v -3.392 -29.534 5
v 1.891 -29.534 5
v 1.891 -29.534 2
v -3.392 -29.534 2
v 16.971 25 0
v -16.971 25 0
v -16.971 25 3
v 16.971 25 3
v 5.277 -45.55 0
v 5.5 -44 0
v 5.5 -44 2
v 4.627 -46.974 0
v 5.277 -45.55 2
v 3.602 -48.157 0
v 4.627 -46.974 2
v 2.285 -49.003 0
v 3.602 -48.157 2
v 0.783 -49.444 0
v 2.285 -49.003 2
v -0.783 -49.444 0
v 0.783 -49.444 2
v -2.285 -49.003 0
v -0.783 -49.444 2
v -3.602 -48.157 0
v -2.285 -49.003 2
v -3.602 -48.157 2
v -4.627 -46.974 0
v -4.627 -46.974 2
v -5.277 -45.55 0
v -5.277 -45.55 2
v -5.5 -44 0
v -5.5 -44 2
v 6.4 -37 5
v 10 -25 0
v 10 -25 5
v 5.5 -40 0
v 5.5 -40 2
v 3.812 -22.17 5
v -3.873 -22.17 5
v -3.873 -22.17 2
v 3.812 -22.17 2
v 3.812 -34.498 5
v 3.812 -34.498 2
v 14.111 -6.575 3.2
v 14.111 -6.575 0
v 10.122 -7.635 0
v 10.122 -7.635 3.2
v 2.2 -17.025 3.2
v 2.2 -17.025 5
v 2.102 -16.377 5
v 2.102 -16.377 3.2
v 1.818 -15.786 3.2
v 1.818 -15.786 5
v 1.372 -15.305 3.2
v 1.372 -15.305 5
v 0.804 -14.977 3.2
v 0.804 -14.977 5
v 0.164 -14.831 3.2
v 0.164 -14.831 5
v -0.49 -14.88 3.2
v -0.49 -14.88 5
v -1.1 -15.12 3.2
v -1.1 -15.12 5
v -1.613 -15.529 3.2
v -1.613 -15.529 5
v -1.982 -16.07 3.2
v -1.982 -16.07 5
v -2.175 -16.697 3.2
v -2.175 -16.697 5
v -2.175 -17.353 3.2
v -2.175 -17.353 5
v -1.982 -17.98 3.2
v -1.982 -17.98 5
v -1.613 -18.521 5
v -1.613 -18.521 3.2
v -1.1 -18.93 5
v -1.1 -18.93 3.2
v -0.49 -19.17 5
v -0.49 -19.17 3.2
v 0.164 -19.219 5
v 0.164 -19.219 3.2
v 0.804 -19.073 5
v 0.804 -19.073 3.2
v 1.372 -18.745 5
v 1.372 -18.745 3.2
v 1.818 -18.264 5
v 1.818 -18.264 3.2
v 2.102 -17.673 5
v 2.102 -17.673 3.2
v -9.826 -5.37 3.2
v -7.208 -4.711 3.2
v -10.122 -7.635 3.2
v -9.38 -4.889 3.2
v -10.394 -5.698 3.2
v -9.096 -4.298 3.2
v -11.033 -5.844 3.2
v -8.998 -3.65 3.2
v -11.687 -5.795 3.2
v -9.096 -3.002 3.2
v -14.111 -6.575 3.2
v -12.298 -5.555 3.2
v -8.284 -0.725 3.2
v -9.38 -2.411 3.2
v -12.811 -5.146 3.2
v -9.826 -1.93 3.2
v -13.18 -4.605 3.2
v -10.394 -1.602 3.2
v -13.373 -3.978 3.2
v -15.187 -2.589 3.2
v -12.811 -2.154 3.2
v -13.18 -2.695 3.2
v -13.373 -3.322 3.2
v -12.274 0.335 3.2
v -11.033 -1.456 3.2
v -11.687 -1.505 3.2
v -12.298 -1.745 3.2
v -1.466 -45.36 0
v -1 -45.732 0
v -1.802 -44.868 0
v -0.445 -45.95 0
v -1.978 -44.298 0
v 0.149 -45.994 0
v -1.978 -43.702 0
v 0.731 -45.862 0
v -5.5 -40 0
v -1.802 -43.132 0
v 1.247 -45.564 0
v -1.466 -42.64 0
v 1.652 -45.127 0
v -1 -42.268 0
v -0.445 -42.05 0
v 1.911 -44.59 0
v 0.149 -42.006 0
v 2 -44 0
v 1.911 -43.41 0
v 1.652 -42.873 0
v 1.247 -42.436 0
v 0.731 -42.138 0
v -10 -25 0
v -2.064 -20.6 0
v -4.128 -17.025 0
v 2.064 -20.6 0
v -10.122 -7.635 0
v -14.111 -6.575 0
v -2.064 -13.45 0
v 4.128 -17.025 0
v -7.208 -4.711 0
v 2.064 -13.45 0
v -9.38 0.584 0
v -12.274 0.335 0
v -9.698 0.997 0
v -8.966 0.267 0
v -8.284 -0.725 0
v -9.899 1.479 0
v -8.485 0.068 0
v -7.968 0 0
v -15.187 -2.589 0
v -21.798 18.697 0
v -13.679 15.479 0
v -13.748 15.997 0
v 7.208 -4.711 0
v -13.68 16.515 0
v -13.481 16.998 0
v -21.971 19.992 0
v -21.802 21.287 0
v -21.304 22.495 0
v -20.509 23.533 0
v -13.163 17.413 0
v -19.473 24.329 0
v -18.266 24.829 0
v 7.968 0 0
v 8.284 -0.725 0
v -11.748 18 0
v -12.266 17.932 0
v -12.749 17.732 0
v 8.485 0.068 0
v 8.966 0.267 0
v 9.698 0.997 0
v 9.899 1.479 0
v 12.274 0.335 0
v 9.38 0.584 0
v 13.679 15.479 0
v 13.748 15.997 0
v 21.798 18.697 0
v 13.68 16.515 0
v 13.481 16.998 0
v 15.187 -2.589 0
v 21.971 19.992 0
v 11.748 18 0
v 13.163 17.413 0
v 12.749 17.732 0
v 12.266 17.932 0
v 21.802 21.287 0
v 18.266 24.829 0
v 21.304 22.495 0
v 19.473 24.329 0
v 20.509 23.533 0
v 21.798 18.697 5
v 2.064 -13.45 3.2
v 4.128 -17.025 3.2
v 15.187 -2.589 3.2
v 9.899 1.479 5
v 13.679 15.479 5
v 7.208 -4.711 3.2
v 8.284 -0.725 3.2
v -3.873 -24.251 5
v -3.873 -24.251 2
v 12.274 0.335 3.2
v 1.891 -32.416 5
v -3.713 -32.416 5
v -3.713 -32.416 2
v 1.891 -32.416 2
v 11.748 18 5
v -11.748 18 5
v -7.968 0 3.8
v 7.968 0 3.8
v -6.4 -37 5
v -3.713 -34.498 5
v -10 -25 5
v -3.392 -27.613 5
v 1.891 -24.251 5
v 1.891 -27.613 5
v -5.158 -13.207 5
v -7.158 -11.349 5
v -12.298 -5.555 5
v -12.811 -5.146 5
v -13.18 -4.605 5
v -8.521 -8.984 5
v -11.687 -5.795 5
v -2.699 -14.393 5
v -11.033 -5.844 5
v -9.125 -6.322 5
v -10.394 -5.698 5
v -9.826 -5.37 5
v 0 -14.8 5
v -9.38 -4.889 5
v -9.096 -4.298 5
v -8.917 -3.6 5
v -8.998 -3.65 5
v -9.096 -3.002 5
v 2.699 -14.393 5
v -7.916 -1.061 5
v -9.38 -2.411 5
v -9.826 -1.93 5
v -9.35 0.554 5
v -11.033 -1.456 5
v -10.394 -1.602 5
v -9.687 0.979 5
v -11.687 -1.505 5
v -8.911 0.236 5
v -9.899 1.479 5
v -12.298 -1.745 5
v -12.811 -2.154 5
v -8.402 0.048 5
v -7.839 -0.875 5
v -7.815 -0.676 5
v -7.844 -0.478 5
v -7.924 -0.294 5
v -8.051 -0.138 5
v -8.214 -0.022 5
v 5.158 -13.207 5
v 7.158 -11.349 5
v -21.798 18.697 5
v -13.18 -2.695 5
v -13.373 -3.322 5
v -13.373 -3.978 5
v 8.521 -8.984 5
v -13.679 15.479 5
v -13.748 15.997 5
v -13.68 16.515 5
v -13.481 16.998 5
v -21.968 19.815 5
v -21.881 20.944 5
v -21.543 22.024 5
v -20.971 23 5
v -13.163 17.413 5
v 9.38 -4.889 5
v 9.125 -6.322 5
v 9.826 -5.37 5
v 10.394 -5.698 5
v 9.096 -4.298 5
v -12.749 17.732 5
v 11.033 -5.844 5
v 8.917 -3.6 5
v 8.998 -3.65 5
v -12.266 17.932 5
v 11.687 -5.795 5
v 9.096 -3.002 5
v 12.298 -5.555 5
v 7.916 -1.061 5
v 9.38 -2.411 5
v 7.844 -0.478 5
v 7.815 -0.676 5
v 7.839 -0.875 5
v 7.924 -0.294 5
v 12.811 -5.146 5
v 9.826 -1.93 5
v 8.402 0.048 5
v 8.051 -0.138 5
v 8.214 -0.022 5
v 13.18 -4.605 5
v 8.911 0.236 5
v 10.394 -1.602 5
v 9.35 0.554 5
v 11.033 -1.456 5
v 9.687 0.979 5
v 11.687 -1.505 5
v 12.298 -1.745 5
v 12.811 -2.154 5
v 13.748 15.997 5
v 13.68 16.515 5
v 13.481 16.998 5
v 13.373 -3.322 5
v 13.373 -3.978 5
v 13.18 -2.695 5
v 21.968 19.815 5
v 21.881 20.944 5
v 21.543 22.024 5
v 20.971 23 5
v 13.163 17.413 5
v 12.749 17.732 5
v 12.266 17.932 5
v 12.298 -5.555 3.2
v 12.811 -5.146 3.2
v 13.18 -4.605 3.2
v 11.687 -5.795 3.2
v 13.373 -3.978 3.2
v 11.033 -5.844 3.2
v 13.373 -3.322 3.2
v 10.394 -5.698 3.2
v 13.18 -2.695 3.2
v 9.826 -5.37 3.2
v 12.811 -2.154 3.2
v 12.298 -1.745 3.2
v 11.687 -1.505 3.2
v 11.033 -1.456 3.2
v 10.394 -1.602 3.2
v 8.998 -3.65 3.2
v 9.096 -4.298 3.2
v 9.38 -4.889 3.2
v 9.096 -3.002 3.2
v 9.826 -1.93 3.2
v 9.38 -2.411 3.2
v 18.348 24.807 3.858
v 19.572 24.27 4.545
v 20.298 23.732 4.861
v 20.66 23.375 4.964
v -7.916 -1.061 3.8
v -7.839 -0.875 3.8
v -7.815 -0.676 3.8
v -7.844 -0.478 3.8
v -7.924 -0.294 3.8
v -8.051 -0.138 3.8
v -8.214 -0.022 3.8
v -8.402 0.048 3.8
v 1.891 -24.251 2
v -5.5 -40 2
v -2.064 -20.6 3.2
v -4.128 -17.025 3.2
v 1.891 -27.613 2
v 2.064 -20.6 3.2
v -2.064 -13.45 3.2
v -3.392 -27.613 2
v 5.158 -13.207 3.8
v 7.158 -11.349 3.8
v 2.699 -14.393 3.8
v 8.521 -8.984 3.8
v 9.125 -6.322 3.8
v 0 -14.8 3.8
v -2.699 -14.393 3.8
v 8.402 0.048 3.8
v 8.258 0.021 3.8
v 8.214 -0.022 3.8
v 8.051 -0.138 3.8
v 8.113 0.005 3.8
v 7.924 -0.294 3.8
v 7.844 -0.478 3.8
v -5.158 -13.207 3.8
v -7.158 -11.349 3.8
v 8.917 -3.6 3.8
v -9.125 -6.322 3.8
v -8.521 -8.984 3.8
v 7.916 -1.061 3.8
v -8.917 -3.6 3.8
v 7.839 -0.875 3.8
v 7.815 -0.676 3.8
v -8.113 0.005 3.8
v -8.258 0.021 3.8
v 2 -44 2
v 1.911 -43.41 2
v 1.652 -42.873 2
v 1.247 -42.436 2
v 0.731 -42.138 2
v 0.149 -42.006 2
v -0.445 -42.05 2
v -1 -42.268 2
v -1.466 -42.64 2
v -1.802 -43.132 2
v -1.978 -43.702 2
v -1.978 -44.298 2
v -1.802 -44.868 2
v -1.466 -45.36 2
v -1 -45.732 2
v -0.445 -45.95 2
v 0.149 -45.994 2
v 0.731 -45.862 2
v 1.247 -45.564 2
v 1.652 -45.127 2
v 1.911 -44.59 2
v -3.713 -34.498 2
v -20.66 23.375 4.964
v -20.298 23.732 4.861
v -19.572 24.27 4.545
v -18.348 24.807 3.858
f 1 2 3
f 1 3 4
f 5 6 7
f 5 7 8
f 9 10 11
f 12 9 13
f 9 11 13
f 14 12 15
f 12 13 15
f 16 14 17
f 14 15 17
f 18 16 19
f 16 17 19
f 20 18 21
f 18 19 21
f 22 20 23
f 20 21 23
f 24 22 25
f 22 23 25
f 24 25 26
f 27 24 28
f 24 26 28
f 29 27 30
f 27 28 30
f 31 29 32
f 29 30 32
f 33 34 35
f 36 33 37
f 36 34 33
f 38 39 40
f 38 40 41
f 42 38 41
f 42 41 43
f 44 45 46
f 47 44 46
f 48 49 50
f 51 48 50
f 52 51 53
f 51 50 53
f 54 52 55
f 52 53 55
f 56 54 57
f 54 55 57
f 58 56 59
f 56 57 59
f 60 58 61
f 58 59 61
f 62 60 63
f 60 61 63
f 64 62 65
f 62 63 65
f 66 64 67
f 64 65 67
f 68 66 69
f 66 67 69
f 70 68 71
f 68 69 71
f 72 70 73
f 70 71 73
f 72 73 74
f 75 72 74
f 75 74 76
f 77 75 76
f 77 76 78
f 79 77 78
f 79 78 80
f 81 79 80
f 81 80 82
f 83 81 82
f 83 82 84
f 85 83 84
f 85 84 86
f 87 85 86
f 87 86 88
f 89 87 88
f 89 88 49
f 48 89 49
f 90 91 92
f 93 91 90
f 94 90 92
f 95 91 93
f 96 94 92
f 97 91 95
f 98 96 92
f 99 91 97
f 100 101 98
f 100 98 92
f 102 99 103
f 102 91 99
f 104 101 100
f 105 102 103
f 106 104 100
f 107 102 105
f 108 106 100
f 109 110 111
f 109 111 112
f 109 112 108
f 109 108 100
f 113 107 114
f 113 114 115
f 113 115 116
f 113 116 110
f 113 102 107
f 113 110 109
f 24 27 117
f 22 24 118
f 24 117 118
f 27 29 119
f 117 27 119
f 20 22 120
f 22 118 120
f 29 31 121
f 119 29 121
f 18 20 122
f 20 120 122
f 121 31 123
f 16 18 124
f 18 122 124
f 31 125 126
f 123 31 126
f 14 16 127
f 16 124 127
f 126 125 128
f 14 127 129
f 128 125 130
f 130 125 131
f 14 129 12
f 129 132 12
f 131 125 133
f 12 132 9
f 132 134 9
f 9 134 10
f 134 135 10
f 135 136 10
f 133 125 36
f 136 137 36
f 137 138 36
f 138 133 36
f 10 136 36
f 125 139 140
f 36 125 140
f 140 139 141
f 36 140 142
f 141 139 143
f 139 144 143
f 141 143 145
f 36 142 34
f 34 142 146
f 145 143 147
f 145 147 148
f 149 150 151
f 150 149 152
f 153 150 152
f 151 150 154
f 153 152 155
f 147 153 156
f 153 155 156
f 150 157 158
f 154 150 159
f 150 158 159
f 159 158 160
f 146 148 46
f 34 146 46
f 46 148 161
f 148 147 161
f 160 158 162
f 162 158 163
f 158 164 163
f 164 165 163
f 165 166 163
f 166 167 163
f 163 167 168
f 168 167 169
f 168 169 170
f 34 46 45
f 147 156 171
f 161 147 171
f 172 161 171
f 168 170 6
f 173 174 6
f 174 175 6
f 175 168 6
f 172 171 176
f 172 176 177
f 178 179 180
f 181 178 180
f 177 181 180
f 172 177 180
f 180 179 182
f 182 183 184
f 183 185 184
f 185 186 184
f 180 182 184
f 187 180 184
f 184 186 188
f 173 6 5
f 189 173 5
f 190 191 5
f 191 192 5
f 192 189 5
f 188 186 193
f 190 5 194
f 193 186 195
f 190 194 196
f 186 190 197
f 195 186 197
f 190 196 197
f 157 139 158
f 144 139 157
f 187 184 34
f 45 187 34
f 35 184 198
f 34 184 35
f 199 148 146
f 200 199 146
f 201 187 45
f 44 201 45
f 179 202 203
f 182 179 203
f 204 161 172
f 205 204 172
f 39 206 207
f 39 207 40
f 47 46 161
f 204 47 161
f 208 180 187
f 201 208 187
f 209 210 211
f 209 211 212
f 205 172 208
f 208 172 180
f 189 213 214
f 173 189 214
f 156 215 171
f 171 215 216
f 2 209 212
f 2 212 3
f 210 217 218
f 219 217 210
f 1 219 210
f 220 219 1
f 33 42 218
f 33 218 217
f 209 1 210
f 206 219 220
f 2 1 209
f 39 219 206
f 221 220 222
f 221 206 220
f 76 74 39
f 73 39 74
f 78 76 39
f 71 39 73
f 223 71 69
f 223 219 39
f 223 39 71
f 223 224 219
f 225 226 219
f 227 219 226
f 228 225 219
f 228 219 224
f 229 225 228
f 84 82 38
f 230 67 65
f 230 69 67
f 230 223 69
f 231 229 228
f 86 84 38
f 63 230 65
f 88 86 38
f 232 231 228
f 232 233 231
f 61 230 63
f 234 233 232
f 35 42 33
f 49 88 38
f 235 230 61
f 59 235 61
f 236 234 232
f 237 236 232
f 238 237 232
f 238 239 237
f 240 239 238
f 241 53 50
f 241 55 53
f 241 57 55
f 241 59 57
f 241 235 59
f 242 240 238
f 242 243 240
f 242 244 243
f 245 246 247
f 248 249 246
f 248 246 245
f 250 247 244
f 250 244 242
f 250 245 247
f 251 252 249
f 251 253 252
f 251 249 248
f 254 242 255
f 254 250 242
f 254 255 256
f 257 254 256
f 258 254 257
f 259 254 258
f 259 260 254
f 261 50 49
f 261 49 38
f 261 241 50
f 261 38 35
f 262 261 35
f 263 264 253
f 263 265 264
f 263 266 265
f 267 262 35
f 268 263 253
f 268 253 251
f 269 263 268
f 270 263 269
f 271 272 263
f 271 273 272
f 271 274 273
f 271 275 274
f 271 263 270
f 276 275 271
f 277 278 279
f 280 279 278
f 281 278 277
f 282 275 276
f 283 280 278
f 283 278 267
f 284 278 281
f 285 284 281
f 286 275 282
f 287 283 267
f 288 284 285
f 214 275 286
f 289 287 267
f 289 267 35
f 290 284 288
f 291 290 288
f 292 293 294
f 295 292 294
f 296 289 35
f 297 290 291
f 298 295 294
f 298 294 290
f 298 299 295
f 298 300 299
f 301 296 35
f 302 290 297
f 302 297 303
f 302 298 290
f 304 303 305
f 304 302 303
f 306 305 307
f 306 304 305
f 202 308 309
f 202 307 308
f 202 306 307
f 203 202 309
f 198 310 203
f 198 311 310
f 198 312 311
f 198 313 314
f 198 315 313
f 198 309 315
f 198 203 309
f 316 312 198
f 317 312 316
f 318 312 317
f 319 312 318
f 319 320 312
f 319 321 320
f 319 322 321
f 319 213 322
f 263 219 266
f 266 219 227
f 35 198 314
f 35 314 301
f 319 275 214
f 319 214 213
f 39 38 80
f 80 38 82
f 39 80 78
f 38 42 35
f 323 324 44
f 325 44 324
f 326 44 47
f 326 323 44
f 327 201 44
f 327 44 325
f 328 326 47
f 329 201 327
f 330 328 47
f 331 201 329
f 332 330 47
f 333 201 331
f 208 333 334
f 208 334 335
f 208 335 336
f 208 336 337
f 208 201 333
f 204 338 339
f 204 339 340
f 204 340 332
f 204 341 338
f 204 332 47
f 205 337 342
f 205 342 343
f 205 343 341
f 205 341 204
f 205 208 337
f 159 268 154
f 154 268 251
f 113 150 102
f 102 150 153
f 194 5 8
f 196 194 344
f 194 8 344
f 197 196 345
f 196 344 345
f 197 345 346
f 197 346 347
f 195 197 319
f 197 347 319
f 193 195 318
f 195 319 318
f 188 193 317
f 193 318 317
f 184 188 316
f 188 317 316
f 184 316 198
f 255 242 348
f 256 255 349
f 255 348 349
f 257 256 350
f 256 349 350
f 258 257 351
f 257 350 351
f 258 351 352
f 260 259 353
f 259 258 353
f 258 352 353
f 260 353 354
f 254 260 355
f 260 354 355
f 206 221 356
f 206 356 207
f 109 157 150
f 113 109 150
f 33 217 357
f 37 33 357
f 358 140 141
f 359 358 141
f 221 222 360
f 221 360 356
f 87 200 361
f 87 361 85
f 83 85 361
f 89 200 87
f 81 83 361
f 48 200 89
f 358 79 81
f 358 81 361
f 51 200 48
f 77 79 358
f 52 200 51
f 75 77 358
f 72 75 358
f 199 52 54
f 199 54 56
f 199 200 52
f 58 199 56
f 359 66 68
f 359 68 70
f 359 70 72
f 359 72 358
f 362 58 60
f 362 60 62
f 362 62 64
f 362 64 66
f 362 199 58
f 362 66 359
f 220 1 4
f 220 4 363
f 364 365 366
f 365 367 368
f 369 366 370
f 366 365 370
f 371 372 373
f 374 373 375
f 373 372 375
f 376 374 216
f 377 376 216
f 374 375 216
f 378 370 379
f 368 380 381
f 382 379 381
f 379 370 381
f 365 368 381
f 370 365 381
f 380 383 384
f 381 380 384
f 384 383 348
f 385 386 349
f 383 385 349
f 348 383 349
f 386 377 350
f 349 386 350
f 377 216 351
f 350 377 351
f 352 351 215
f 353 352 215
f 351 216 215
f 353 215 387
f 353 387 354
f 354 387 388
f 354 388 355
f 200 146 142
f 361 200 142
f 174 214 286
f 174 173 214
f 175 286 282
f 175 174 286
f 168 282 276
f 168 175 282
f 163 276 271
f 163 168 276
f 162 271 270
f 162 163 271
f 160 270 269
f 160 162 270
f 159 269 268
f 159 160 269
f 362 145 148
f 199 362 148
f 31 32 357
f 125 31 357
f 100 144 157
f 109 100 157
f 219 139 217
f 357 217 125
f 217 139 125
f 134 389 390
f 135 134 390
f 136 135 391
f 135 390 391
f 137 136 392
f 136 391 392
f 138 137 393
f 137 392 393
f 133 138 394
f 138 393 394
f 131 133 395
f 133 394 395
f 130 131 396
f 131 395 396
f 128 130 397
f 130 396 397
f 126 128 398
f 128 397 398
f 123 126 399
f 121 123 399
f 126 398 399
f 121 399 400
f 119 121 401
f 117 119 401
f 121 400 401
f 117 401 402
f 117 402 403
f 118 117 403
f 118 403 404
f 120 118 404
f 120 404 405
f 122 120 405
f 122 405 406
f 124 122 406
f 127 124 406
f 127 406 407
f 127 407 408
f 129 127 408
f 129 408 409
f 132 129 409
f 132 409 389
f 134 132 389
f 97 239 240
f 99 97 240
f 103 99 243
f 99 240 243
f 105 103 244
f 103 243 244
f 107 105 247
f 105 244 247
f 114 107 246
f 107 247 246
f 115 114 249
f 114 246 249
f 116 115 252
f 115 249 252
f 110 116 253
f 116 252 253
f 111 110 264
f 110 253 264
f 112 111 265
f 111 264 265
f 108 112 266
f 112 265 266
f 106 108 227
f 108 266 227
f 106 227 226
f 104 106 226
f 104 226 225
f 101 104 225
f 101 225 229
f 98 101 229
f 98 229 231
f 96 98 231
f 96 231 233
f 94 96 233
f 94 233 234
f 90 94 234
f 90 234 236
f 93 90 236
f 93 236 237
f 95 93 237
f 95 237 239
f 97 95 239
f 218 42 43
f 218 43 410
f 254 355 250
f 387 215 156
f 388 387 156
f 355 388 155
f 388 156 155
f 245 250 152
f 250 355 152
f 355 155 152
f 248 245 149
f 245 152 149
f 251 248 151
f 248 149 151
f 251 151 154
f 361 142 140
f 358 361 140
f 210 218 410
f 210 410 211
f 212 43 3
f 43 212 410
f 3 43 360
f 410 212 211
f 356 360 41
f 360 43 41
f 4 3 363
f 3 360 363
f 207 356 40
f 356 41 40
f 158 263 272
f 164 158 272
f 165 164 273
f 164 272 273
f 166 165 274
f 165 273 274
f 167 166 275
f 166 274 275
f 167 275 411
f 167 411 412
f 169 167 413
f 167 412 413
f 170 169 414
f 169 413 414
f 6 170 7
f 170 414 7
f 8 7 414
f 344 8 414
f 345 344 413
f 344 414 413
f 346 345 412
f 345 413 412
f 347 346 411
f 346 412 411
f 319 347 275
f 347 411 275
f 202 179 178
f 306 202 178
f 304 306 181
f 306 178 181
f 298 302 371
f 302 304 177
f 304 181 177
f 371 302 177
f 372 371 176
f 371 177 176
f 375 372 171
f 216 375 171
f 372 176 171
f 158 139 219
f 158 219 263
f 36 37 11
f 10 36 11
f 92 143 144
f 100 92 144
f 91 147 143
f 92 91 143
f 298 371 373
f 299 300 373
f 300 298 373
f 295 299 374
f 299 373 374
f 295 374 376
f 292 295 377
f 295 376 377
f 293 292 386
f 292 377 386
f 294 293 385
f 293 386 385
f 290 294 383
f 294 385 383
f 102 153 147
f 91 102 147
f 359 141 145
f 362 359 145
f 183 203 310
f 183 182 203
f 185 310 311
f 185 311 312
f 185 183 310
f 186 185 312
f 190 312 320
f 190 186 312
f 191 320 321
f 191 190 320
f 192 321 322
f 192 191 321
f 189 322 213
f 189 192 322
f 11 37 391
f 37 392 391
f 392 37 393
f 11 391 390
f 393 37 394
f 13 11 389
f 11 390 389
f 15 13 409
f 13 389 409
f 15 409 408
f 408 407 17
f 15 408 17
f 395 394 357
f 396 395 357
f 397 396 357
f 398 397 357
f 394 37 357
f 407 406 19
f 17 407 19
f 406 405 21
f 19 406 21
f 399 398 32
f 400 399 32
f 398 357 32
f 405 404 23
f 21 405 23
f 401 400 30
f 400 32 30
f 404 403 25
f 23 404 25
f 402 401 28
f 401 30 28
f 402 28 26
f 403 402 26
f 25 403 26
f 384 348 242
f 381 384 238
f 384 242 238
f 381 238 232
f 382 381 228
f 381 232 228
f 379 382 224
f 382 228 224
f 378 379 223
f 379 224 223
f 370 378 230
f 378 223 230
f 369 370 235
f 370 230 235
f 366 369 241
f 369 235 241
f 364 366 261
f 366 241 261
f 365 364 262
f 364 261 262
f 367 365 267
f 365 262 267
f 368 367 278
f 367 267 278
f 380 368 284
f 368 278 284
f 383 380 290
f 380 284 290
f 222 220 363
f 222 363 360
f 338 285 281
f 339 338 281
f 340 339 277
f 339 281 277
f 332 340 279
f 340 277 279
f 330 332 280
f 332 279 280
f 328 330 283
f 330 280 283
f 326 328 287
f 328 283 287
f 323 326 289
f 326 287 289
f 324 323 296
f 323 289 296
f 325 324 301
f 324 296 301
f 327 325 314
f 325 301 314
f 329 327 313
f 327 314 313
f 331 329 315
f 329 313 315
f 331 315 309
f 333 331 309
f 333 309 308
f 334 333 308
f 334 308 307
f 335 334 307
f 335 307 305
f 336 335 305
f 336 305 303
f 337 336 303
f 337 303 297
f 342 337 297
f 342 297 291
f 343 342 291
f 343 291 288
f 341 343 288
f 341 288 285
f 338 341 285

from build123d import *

# Parameters (mm, degrees)
BOSS_EXTRUDE1_DEPTH = 5
CUT_EXTRUDE1_REACH  = 36.673
SKETCH5_R           = 9.15
CUT_EXTRUDE3_DEPTH  = 1.2
CUT_EXTRUDE4_REACH  = 36.673
SKETCH6_R           = 2.2
CUT_EXTRUDE5_DEPTH  = 3.2
SKETCH8_W           = 20
SKETCH8_H           = 5
BOSS_EXTRUDE2_DEPTH = 15
SKETCH3_R           = 2
BOSS_EXTRUDE3_DEPTH = 5
CUT_EXTRUDE6_REACH  = 57.023
FILLET2_R           = 2
CUT_EXTRUDE7_DEPTH  = 3
CUT_EXTRUDE8_DEPTH  = 12.5
FILLET3_R           = 5
FILLET4_R           = 2
FILLET5_R           = 0.75


with BuildPart() as part:
    # Sketch1 → Boss-Extrude1 (new body)
    with BuildSketch(Plane.XY):
        Polygon((-23.5, 25), (23.5, 25), (10, -25), (-10, -25), align=None)
    extrude(amount=BOSS_EXTRUDE1_DEPTH)

    # Sketch2 → Cut-Extrude1 (cut, up to next)
    with BuildSketch(Plane.XY.offset(5), mode=Mode.PRIVATE) as cut_extrude1_sk1:
        Polygon((-9.499337961, 0), (9.499337961, 0), (14.359337961, 18), (-14.359337961, 18), align=None)
    cut_extrude1_tool1 = extrude(cut_extrude1_sk1.sketch, amount=-CUT_EXTRUDE1_REACH, mode=Mode.PRIVATE) & part.part
    add(cut_extrude1_tool1.solids().sort_by_distance((0, 9.611098, 5))[0], mode=Mode.SUBTRACT)

    # Sketch5 → Cut-Extrude3 (cut)
    with BuildSketch(Plane.XY.offset(5)):
        with Locations((0, -5.65)):
            Circle(SKETCH5_R)
    extrude(amount=-CUT_EXTRUDE3_DEPTH, mode=Mode.SUBTRACT)

    # Sketch6 → Cut-Extrude4 (cut, up to next)
    with BuildSketch(Plane.XY.offset(5), mode=Mode.PRIVATE) as cut_extrude4_sk1:
        with Locations((-11.197795542, -3.65)):
            Circle(SKETCH6_R)
    cut_extrude4_tool1 = extrude(cut_extrude4_sk1.sketch, amount=-CUT_EXTRUDE4_REACH, mode=Mode.PRIVATE) & part.part
    # Sketch6 → Cut-Extrude4 (cut, up to next)
    with BuildSketch(Plane.XY.offset(5), mode=Mode.PRIVATE) as cut_extrude4_sk2:
        with Locations((0, -17.025)):
            Circle(SKETCH6_R)
    cut_extrude4_tool2 = extrude(cut_extrude4_sk2.sketch, amount=-CUT_EXTRUDE4_REACH, mode=Mode.PRIVATE) & part.part
    # Sketch6 → Cut-Extrude4 (cut, up to next)
    with BuildSketch(Plane.XY.offset(5), mode=Mode.PRIVATE) as cut_extrude4_sk3:
        with Locations(Location((11.197795542, -3.65, 0), (0, 0, 180))):
            Circle(SKETCH6_R)
    cut_extrude4_tool3 = extrude(cut_extrude4_sk3.sketch, amount=-CUT_EXTRUDE4_REACH, mode=Mode.PRIVATE) & part.part
    add(cut_extrude4_tool1.solids().sort_by_distance((-11.197796, -3.65, 5))[0], mode=Mode.SUBTRACT)
    add(cut_extrude4_tool2.solids().sort_by_distance((0, -17.025, 5))[0], mode=Mode.SUBTRACT)
    add(cut_extrude4_tool3.solids().sort_by_distance((11.197796, -3.65, 5))[0], mode=Mode.SUBTRACT)

    # Sketch7 → Cut-Extrude5 (cut)
    with BuildSketch(Plane(origin=(0, 0, 0), x_dir=(-1, 0, 0), z_dir=(0, 0, -1))):
        Polygon((-7.208365159, -4.710791476), (-8.284407984, -0.72544768), (-12.273838367, 0.335343796), (-15.187225925, -2.589208524), (-14.1111831, -6.57455232), (-10.121752717, -7.635343796), align=None)
        Polygon((-4.128054425, -17.025), (-2.064027212, -20.6), (2.064027212, -20.6), (4.128054425, -17.025), (2.064027212, -13.45), (-2.064027212, -13.45), align=None)
        Polygon((10.121752717, -7.635343796), (14.1111831, -6.57455232), (15.187225925, -2.589208524), (12.273838367, 0.335343796), (8.284407984, -0.72544768), (7.208365159, -4.710791476), align=None)
    extrude(amount=-CUT_EXTRUDE5_DEPTH, mode=Mode.SUBTRACT)

    # Sketch8 → Boss-Extrude2 (add)
    with BuildSketch(Plane.XZ.offset(25)):
        with Locations((0, 2.5)):
            Rectangle(SKETCH8_W, SKETCH8_H)
    extrude(amount=BOSS_EXTRUDE2_DEPTH)

    # Sketch3 → Boss-Extrude3 (add)
    with BuildSketch(Plane.XY.offset(5)):
        with BuildLine():
            Line((-5.5, -44), (-5.5, -40))
            Line((-5.5, -40), (5.5, -40))
            Line((5.5, -40), (5.5, -44))
            ThreePointArc((5.5, -44), (0, -49.5), (-5.5, -44))
        make_face()
        with Locations((0, -44)):
            Circle(SKETCH3_R, mode=Mode.SUBTRACT)
    extrude(amount=-BOSS_EXTRUDE3_DEPTH)

    # Sketch9 → Cut-Extrude6 (cut, up to next)
    with BuildSketch(Plane(origin=(0, 0, 0), x_dir=(-1, 0, 0), z_dir=(0, 0, -1)), mode=Mode.PRIVATE) as cut_extrude6_sk1:
        Polygon((-10, -25), (-5.5, -40), (-10, -40), align=None)
    cut_extrude6_tool1 = extrude(cut_extrude6_sk1.sketch, amount=-CUT_EXTRUDE6_REACH, mode=Mode.PRIVATE) & part.part
    # Sketch9 → Cut-Extrude6 (cut, up to next)
    with BuildSketch(Plane(origin=(0, 0, 0), x_dir=(-1, 0, 0), z_dir=(0, 0, -1)), mode=Mode.PRIVATE) as cut_extrude6_sk2:
        Polygon((10, -25), (5.5, -40), (10, -40), align=None)
    cut_extrude6_tool2 = extrude(cut_extrude6_sk2.sketch, amount=-CUT_EXTRUDE6_REACH, mode=Mode.PRIVATE) & part.part
    add(cut_extrude6_tool1.solids().sort_by_distance((8.5, -35, 0))[0], mode=Mode.SUBTRACT)
    add(cut_extrude6_tool2.solids().sort_by_distance((-8.5, -35, 0))[0], mode=Mode.SUBTRACT)

    # Fillet2
    fillet2_edges = [part.edges().sort_by_distance(p)[0] for p in [
        (-9.499337961, 0, 2.5),
        (-14.359337961, 18, 2.5),
        (14.359337961, 18, 2.5),
        (9.499337961, 0, 2.5),
    ]]
    fillet(fillet2_edges, radius=FILLET2_R)

    # Sketch12 → Cut-Extrude7 (cut)
    with BuildSketch(Plane.XY.offset(5)):
        Polygon((3.812269091, -22.169612745), (3.812269091, -34.497542433), (-3.712571108, -34.497542433), (-3.712571108, -32.416203654), (1.891033295, -32.416203654), (1.891033295, -29.534349961), (-3.392365142, -29.534349961), (-3.392365142, -27.613114166), (1.891033295, -27.613114166), (1.891033295, -24.250951523), (-3.872674091, -24.250951523), (-3.872674091, -22.169612745), align=None)
    extrude(amount=-CUT_EXTRUDE7_DEPTH, mode=Mode.SUBTRACT)

    # Sketch13 → Cut-Extrude8 (cut, symmetric)
    with BuildSketch(Plane.ZY.offset(5.5)):
        Polygon((5, -37), (2, -40), (2, -51.866140446), (5, -51.866140446), align=None)
    extrude(amount=CUT_EXTRUDE8_DEPTH, both=True, mode=Mode.SUBTRACT)

    # Fillet3
    fillet3_edges = [part.edges().sort_by_distance(p)[0] for p in [
        (-23.5, 25, 2.5),
        (23.5, 25, 2.5),
    ]]
    fillet(fillet3_edges, radius=FILLET3_R)

    # Fillet4
    # the kernel refuses this fillet: 2 mm, written as the material it takes off along each edge
    with BuildSketch(Plane(origin=(-21.970955687, 25, 5), x_dir=(0, 0, -1), z_dir=(1, 0, 0))) as fillet4_piece_1:
        with BuildLine():
            CenterArc((FILLET4_R, -FILLET4_R), FILLET4_R, 90, 90)
            Line((0, -FILLET4_R), (0, 0))
            Line((0, 0), (FILLET4_R, 0))
        make_face()
    extrude(amount=43.941911373, mode=Mode.SUBTRACT)

    # Fillet5
    # the kernel refuses this fillet: 0.75 mm, written as the material it takes off along each edge
    with BuildSketch(Plane(origin=(-7.197221686, 0, 3.8), x_dir=(-0.999217435066786, 0.03955398157649034, 0), z_dir=(0, 0, 1))) as fillet5_piece_1:
        with BuildLine():
            CenterArc((1.339281213, 0.737984469), FILLET5_R, 152.162782465, 107.567464563)
            Line((0.676072834, 1.088205323), (0.609751996, 1.123227408))
            ThreePointArc((0.609751996, 1.123227408), (0.293398819, 0.571834806), (-0.060779257, 0.043941801))
            Line((-0.060779257, 0.043941801), (0.002966549, -0.074941308))
            ThreePointArc((0.002966549, -0.074941308), (0.772862133, -0.044465022), (1.192197913, -0.073798447))
            Line((1.192197913, -0.073798447), (1.205569122, 0))
        make_face()
    extrude(amount=4.402796923, mode=Mode.SUBTRACT)
    with BuildSketch(Plane(origin=(7.197221686, 0, 3.8), x_dir=(0.999217435066786, 0.039553981576491995, 0), z_dir=(0, 0, 1))) as fillet5_piece_2:
        with BuildLine():
            CenterArc((1.339281213, -0.737984469), FILLET5_R, 100.269752973, 107.567464563)
            Line((0.676072834, -1.088205323), (0.609751996, -1.123227408))
            ThreePointArc((0.609751996, -1.123227408), (0.293398819, -0.571834806), (-0.060779257, -0.043941801))
            Line((-0.060779257, -0.043941801), (0.002966549, 0.074941308))
            ThreePointArc((0.002966549, 0.074941308), (0.772862133, 0.044465022), (1.192197913, 0.073798447))
            Line((1.192197913, 0.073798447), (1.205569122, 0))
        make_face()
    extrude(amount=4.402796923, mode=Mode.SUBTRACT)


solid = part.part
